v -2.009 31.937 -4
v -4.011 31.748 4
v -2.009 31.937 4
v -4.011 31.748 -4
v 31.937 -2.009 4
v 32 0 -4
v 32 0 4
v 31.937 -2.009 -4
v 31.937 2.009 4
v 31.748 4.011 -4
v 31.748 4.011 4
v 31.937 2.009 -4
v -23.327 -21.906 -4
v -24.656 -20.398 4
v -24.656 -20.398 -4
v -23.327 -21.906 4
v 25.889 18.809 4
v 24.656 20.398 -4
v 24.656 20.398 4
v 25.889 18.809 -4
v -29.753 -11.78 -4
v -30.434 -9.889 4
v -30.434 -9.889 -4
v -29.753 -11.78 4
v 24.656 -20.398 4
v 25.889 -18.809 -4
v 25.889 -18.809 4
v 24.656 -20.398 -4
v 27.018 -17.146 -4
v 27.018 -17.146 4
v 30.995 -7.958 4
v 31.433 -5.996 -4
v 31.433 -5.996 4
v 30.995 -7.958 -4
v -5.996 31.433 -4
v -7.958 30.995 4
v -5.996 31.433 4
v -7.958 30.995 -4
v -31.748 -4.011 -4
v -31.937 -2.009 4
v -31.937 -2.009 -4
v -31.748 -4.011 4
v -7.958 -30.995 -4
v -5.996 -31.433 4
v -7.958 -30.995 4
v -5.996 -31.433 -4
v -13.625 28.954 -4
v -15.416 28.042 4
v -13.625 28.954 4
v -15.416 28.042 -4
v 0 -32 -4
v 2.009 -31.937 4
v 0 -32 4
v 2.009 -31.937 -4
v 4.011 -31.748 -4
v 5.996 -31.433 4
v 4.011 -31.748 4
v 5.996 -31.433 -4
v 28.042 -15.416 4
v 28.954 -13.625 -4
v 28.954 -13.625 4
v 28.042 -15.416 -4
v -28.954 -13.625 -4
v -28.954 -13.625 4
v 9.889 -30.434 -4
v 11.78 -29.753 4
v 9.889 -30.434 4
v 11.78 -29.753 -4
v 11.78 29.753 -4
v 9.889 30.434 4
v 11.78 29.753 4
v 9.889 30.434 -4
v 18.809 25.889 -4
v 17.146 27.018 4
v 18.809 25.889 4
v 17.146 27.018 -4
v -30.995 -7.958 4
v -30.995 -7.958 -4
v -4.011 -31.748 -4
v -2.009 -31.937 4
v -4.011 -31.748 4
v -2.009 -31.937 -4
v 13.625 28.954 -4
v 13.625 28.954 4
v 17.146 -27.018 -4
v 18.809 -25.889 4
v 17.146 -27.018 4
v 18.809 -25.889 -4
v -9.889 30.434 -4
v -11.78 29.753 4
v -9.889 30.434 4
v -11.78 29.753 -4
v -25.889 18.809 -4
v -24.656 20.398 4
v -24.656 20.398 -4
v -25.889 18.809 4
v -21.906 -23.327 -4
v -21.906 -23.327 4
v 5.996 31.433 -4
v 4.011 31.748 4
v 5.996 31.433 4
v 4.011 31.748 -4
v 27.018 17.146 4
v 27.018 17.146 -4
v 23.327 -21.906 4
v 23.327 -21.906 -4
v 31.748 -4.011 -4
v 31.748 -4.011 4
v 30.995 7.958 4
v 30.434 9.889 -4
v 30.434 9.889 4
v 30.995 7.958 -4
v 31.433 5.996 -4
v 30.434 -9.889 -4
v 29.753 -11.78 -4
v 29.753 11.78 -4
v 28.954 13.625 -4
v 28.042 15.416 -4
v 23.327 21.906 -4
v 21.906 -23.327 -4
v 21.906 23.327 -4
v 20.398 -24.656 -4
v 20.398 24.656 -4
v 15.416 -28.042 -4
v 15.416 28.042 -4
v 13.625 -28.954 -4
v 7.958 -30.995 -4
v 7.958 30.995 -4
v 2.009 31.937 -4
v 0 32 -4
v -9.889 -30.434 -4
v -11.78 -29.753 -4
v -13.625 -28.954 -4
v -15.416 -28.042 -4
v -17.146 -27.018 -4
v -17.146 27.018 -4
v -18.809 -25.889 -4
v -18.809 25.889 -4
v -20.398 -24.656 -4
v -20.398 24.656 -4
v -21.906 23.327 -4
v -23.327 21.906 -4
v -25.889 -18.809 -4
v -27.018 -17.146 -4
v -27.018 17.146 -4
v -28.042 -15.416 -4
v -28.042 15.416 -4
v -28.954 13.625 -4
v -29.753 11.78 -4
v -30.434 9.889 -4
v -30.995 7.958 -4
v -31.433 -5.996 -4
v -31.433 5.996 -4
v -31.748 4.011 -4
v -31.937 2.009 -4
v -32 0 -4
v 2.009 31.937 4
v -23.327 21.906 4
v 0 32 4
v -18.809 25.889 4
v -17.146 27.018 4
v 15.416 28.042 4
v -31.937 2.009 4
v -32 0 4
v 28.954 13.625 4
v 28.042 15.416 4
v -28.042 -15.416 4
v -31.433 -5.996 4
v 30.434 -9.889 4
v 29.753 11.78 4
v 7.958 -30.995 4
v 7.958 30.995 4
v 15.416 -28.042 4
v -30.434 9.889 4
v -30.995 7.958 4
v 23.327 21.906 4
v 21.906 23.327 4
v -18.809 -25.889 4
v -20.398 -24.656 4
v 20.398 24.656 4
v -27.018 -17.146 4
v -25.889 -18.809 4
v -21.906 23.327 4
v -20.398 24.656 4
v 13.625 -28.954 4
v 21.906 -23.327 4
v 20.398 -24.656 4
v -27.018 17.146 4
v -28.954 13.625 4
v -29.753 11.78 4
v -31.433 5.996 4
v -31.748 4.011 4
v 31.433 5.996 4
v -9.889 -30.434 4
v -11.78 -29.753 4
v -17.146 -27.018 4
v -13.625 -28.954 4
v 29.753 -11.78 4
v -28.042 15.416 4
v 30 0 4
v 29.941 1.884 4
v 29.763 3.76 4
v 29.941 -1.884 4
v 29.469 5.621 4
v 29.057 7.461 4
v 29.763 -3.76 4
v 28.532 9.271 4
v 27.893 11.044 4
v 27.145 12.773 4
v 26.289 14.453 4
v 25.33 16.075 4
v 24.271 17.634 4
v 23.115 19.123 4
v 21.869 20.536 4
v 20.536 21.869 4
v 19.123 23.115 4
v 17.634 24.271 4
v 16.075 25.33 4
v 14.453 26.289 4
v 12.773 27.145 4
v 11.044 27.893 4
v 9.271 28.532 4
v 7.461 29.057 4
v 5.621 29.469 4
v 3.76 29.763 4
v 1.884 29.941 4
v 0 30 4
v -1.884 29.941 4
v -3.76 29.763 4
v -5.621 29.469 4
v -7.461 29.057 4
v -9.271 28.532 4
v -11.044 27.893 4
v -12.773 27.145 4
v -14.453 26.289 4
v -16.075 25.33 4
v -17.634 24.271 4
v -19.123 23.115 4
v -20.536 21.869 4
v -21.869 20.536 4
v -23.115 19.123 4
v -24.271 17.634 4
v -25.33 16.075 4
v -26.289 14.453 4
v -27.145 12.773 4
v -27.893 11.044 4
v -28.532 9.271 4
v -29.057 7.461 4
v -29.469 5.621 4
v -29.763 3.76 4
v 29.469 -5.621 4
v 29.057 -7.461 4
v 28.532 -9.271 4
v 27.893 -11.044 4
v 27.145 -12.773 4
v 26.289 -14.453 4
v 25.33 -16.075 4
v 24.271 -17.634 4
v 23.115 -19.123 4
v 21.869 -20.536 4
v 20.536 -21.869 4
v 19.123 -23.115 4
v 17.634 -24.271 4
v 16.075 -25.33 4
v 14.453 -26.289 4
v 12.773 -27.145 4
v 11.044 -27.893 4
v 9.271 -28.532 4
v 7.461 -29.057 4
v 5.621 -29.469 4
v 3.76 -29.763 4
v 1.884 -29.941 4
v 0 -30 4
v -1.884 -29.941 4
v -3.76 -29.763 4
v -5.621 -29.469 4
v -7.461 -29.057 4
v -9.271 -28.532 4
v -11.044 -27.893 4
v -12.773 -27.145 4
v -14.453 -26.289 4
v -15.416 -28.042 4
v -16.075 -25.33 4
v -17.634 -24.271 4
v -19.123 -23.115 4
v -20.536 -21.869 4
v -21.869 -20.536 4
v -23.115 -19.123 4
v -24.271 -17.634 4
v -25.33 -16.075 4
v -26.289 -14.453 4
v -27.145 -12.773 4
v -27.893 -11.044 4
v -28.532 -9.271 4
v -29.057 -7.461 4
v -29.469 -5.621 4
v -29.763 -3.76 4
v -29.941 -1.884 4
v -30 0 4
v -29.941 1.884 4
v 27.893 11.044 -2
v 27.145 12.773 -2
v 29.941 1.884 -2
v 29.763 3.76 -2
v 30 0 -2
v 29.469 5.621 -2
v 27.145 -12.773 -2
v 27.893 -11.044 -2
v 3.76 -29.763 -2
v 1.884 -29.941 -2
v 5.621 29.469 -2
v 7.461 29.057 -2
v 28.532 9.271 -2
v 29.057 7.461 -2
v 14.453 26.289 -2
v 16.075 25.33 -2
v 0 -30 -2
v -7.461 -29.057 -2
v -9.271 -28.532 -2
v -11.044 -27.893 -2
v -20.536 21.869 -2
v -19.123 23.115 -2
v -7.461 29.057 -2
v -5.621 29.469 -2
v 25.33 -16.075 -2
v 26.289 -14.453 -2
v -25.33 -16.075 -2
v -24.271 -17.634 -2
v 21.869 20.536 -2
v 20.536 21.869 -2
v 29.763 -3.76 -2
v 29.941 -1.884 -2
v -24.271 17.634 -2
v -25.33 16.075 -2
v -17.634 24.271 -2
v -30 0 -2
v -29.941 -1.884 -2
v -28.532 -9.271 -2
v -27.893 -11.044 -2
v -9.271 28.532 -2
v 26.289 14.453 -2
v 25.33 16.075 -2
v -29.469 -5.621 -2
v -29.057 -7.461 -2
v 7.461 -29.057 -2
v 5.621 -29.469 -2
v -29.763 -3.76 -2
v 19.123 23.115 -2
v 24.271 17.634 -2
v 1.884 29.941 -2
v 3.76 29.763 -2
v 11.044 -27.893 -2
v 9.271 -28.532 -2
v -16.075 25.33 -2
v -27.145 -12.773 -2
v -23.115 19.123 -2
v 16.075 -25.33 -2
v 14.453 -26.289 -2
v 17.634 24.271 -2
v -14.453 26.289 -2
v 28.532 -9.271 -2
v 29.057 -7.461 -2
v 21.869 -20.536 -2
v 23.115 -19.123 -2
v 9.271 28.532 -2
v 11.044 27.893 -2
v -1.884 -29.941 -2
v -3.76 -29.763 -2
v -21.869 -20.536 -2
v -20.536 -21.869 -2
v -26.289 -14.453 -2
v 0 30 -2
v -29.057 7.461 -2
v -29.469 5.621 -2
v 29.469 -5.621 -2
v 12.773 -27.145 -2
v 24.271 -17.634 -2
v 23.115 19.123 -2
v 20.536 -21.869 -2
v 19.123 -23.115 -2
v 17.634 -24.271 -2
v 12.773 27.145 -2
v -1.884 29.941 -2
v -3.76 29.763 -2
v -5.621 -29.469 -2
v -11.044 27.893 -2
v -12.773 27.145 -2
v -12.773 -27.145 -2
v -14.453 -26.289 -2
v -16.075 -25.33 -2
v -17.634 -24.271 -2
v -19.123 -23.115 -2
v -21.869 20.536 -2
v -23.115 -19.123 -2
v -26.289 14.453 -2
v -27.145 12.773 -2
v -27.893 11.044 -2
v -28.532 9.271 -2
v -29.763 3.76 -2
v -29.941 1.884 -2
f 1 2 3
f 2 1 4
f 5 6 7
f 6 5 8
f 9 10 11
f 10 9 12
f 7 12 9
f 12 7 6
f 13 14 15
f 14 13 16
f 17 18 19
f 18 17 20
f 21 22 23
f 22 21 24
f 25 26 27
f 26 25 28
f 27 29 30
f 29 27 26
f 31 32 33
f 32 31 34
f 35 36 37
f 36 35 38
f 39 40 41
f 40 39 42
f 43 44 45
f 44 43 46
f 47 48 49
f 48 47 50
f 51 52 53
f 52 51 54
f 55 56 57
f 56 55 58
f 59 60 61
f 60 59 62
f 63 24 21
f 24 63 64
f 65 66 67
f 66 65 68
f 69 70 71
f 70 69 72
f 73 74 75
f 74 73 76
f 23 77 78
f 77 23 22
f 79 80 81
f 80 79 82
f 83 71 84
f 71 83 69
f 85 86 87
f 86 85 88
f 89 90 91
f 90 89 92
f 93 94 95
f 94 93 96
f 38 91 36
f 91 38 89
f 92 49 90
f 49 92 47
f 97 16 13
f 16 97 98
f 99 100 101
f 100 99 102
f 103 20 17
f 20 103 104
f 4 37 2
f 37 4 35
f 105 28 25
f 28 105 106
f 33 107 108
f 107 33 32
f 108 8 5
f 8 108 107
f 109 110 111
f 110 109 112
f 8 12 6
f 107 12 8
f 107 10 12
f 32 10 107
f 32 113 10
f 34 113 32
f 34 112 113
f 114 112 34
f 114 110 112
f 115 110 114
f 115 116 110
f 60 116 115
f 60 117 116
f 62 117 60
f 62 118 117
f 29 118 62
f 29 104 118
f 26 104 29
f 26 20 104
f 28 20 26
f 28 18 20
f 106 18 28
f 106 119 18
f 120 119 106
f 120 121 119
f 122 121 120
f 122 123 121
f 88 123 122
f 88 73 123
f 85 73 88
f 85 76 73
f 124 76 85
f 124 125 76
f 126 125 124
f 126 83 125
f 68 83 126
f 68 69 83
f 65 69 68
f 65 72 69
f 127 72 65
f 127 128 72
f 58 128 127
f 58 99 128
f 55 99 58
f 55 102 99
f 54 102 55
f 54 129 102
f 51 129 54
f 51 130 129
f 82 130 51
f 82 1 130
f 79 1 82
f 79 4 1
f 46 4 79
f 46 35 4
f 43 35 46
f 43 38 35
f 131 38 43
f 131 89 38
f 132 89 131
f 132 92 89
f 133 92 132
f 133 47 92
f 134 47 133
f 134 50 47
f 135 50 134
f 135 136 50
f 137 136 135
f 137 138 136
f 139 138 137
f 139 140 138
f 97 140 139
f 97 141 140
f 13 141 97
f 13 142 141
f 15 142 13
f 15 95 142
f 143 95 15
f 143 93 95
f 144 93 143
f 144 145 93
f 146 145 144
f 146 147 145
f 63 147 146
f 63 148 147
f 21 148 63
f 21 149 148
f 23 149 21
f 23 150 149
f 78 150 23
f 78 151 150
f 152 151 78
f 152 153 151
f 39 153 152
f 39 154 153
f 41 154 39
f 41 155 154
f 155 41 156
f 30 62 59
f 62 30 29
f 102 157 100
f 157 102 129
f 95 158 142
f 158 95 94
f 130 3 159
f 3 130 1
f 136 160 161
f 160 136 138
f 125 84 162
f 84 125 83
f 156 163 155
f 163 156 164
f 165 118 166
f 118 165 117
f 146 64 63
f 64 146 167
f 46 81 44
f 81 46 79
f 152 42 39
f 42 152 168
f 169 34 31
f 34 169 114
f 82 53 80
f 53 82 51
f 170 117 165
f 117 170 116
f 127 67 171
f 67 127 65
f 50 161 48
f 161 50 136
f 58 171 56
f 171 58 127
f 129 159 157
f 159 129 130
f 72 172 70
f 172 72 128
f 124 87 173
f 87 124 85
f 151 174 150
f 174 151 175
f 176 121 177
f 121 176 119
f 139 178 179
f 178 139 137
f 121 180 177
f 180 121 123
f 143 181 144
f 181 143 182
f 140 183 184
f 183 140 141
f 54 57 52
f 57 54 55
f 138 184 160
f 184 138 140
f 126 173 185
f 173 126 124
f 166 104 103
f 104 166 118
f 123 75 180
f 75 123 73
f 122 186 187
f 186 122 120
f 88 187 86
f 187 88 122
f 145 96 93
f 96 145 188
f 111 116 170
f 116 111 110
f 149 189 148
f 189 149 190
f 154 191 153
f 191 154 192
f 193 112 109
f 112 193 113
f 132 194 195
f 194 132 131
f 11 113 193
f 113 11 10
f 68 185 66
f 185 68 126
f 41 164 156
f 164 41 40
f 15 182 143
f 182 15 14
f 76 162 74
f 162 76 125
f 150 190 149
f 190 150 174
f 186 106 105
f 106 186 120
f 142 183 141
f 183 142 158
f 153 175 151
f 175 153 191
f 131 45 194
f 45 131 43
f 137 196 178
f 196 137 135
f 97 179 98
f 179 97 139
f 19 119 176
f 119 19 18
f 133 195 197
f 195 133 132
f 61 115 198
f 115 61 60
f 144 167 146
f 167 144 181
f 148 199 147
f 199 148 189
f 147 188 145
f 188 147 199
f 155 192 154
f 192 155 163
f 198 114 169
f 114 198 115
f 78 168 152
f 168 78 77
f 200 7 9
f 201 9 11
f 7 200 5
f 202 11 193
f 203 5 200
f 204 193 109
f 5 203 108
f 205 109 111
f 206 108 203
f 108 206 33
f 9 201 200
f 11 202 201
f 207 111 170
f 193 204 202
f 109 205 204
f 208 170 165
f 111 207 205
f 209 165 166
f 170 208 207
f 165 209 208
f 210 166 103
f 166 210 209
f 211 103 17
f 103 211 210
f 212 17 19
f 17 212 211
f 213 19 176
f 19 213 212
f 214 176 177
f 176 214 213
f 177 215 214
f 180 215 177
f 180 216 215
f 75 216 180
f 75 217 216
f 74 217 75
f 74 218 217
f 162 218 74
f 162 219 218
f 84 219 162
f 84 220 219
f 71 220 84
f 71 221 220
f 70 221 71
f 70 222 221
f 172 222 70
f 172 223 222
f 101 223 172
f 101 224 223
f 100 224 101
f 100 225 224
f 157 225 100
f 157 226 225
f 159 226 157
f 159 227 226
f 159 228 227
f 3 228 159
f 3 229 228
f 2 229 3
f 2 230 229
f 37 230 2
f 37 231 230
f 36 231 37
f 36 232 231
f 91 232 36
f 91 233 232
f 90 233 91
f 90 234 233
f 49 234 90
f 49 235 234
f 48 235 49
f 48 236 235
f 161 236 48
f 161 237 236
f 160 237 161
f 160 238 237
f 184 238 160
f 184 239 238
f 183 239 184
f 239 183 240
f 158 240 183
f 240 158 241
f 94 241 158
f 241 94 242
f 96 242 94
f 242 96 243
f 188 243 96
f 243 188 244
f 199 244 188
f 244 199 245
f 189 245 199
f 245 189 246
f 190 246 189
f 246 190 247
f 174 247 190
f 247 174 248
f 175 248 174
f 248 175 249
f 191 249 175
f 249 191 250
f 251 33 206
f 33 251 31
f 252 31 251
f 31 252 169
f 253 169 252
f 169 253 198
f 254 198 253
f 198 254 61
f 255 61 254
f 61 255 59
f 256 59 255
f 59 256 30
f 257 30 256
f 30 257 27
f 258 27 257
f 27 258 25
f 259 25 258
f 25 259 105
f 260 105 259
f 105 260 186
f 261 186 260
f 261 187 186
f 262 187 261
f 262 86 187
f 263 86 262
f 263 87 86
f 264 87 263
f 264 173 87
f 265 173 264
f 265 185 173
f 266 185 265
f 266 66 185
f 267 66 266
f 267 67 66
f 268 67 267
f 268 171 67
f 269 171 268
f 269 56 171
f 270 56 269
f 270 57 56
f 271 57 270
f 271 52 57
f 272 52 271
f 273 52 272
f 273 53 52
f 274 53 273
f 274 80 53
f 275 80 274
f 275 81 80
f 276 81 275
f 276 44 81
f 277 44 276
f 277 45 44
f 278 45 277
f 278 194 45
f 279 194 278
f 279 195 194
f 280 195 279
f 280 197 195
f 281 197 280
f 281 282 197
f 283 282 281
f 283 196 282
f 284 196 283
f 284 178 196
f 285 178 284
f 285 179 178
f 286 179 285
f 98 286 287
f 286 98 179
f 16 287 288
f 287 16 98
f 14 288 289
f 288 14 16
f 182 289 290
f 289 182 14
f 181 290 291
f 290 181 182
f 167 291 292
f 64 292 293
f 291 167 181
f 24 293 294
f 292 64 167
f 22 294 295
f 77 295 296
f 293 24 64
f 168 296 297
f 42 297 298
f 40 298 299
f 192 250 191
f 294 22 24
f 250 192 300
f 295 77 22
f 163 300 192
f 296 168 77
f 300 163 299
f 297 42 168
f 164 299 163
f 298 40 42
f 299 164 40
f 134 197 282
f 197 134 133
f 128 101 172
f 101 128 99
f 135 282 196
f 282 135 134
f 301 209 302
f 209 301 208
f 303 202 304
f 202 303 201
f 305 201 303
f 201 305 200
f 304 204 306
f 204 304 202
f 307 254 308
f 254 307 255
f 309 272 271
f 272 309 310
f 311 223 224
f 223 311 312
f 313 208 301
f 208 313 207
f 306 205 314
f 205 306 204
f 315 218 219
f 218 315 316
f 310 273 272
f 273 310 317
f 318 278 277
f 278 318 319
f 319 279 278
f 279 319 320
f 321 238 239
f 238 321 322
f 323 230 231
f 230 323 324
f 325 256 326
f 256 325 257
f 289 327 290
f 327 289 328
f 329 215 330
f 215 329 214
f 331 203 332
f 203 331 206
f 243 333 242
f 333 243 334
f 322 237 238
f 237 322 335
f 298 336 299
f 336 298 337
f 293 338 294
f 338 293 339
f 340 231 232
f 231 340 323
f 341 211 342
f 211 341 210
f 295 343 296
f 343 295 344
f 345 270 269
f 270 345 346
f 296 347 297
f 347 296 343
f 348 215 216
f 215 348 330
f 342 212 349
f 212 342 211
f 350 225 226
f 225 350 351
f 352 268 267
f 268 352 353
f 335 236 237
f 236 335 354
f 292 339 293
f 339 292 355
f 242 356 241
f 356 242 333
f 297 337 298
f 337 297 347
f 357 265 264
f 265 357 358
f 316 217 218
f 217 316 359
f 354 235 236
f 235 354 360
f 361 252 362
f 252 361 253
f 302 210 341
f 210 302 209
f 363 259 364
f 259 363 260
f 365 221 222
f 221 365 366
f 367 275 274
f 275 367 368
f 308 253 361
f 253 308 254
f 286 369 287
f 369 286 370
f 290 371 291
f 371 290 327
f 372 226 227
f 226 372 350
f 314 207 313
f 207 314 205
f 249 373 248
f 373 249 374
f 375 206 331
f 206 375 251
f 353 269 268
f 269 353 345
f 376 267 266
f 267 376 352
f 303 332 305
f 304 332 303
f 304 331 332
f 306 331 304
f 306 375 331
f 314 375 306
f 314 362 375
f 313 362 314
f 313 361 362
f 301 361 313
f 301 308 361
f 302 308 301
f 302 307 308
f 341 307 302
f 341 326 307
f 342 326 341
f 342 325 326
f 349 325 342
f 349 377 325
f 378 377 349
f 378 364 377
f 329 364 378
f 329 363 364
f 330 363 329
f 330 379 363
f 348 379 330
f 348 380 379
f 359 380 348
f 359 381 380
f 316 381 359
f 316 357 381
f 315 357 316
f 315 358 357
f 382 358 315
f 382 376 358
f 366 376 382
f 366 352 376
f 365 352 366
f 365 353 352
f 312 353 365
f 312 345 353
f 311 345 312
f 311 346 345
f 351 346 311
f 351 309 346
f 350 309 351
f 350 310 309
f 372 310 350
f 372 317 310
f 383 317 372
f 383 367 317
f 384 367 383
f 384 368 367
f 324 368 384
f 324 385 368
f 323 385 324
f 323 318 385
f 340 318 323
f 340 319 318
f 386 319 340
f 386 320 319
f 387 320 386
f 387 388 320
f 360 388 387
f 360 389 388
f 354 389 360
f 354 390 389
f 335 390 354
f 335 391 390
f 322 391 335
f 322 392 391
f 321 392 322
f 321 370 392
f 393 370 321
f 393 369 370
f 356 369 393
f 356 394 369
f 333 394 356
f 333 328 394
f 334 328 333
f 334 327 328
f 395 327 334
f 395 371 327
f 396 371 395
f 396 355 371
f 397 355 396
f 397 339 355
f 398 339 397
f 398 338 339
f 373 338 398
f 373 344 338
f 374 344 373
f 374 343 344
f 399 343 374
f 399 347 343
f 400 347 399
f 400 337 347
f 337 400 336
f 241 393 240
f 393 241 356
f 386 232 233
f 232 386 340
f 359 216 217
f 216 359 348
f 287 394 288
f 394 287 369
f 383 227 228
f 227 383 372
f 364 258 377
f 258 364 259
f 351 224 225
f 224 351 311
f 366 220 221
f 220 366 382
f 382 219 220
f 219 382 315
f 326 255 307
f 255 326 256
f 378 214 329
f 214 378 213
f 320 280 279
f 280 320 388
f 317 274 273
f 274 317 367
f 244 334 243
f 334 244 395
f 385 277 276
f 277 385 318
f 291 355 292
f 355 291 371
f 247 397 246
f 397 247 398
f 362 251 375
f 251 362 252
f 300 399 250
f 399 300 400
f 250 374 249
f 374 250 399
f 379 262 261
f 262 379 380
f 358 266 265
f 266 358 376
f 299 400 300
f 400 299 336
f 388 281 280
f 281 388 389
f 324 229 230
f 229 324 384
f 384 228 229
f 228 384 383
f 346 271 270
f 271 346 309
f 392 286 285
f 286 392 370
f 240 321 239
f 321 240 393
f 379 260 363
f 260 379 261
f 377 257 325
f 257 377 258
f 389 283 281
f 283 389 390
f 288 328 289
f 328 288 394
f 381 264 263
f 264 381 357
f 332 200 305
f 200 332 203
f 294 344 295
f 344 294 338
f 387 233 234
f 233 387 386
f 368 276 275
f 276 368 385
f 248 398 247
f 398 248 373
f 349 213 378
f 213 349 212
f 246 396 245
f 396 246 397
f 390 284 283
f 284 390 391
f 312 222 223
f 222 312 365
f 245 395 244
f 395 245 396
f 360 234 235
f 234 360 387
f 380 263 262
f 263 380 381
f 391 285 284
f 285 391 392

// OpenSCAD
/*                                                
 * A lens cap.
 * Units in mm, default values are for
 * a PENTACON auto 2.8/135 MC lens. 
 *
 * 2021, Joris La Cancellera
 * License: CC-BY-SA
 *
 */

/* [primary] */

// Total height of the cap
height = 8; // [2:40]
// Inner (mechanical) diameter of the cap
inner_dia = 60; // [40:300]
// Wall thickness
thickness = 2.0; // [1:0.5:5]

/* [Hidden] */
$fn=100;
outer_dia = inner_dia + 2 * thickness;

/* [Code] */
difference()
{       
    cylinder(d=outer_dia, h=height, center=true);
    translate([0,0,thickness])
        cylinder(d=inner_dia, h=height, center=true);
}
